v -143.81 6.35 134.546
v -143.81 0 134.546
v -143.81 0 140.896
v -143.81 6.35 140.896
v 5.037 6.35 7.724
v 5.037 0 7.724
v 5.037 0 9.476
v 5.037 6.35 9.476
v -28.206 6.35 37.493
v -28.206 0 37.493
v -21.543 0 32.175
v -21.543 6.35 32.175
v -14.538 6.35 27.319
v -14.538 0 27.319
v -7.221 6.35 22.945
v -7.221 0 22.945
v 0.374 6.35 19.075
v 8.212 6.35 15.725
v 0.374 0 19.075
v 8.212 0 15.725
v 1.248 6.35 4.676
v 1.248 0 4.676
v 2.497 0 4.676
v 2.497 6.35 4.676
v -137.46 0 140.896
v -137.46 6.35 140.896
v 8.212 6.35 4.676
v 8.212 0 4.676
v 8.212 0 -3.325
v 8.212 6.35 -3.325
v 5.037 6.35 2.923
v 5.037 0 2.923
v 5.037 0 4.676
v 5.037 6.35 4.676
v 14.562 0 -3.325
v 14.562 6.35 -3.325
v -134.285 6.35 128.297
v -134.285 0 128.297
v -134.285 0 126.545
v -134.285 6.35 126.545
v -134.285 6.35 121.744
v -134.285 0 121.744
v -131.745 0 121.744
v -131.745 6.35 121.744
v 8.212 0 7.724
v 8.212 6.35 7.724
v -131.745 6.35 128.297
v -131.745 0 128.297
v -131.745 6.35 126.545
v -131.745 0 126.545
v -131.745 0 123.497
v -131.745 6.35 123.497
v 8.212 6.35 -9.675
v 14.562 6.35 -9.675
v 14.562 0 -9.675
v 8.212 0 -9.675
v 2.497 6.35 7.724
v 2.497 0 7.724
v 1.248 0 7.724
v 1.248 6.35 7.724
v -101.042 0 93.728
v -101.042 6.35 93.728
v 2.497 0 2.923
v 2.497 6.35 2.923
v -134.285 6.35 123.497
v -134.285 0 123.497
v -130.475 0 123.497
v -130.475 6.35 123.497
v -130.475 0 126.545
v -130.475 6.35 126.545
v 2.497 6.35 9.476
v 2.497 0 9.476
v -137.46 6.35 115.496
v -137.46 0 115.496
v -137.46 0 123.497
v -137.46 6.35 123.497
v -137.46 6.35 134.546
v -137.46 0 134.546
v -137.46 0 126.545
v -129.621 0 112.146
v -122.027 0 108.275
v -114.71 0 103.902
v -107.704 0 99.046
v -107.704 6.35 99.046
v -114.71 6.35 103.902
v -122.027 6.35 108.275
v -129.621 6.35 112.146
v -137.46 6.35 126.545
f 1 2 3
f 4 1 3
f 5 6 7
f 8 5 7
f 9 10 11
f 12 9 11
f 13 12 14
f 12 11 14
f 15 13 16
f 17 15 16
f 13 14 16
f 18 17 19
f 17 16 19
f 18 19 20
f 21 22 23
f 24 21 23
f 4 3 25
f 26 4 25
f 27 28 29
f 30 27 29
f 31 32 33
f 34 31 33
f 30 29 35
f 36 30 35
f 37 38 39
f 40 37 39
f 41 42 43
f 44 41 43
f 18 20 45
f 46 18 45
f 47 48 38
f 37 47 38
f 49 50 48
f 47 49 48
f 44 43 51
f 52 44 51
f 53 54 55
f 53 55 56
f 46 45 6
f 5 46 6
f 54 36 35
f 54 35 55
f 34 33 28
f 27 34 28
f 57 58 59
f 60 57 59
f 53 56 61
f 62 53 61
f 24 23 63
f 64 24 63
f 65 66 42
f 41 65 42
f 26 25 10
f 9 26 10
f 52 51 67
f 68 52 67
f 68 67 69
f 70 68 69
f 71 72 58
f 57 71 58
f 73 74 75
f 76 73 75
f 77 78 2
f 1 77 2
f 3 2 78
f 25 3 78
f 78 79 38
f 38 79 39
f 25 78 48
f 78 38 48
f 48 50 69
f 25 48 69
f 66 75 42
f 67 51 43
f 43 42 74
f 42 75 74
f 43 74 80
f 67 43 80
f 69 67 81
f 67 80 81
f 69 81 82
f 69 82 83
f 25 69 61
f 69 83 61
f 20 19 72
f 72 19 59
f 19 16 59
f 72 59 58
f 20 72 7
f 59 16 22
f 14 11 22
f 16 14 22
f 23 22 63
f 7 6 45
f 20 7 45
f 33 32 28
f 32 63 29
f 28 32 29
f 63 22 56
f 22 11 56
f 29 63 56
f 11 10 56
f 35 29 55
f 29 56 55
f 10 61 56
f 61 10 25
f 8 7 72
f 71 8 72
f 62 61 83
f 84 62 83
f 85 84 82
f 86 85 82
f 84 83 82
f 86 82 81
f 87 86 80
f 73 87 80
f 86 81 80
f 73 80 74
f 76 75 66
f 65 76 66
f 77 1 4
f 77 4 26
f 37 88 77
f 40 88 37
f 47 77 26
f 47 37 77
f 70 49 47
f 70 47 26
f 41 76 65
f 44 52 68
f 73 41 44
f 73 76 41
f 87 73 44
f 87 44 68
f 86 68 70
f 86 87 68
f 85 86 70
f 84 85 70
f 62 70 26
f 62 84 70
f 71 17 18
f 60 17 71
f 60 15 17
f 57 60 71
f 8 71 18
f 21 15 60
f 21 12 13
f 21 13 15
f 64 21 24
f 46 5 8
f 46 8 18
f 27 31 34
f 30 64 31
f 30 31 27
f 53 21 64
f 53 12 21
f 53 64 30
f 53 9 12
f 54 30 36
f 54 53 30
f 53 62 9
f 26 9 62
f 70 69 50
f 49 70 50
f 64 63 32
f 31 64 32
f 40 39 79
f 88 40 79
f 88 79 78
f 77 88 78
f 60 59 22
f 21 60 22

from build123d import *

# Parameters (mm, degrees)
BOSS_EXTRUDE1_DEPTH = 6.35


with BuildPart() as part:
    # Sketch1 → Boss-Extrude1 (new body)
    with BuildSketch(Plane(origin=(0, 0, 0), x_dir=(1, 0, 0), z_dir=(0, 1, 0))):
        with BuildLine():
            Line((1.248119104, -4.675816263), (2.497415053, -4.675816263))
            Line((2.497415053, -4.675816263), (2.497415053, -2.923216263))
            Line((2.497415053, -2.923216263), (5.037415053, -2.923216263))
            Line((5.037415053, -2.923216263), (5.037415053, -4.675816263))
            Line((5.037415053, -4.675816263), (8.212415053, -4.675816263))
            Line((8.212415053, -4.675816263), (8.212415053, -3.02471078))
            Line((8.212415053, -3.02471078), (8.212415053, 3.32528922))
            Line((8.212415053, 3.32528922), (14.562415053, 3.32528922))
            Line((14.562415053, 3.32528922), (14.562415053, 9.67528922))
            Line((14.562415053, 9.67528922), (8.212415053, 9.67528922))
            Line((8.212415053, 9.67528922), (-101.041741874, -93.72811078))
            ThreePointArc((-101.041741874, -93.72811078), (-118.331248541, -106.150388972), (-137.459794183, -115.49591078))
            Line((-137.459794183, -115.49591078), (-137.459794183, -123.496945941))
            Line((-137.459794183, -123.496945941), (-134.284794183, -123.496945941))
            Line((-134.284794183, -123.496945941), (-134.284794183, -121.744345941))
            Line((-134.284794183, -121.744345941), (-131.744794183, -121.744345941))
            Line((-131.744794183, -121.744345941), (-131.744794183, -123.496945941))
            Line((-131.744794183, -123.496945941), (-130.474794183, -123.496945941))
            Line((-130.474794183, -123.496945941), (-130.474794183, -126.544805297))
            Line((-130.474794183, -126.544805297), (-131.744794183, -126.544805297))
            Line((-131.744794183, -126.544805297), (-131.744794183, -128.297405297))
            Line((-131.744794183, -128.297405297), (-134.284794183, -128.297405297))
            Line((-134.284794183, -128.297405297), (-134.284794183, -126.544805297))
            Line((-134.284794183, -126.544805297), (-137.459794183, -126.544805297))
            Line((-137.459794183, -126.544805297), (-137.459794183, -134.54591078))
            Line((-137.459794183, -134.54591078), (-143.809794183, -134.54591078))
            Line((-143.809794183, -134.54591078), (-143.809794183, -140.89591078))
            Line((-143.809794183, -140.89591078), (-137.459794183, -140.89591078))
            Line((-137.459794183, -140.89591078), (-28.205637256, -37.49251078))
            ThreePointArc((-28.205637256, -37.49251078), (-10.916130589, -25.070232587), (8.212415053, -15.72471078))
            Line((8.212415053, -15.72471078), (8.212415053, -7.723675619))
            Line((8.212415053, -7.723675619), (5.037415053, -7.723675619))
            Line((5.037415053, -7.723675619), (5.037415053, -9.476275619))
            Line((5.037415053, -9.476275619), (2.497415053, -9.476275619))
            Line((2.497415053, -9.476275619), (2.497415053, -7.723675619))
            Line((2.497415053, -7.723675619), (1.248119104, -7.723675619))
            Line((1.248119104, -7.723675619), (1.248119104, -4.675816263))
        make_face()
    extrude(amount=BOSS_EXTRUDE1_DEPTH)


solid = part.part
